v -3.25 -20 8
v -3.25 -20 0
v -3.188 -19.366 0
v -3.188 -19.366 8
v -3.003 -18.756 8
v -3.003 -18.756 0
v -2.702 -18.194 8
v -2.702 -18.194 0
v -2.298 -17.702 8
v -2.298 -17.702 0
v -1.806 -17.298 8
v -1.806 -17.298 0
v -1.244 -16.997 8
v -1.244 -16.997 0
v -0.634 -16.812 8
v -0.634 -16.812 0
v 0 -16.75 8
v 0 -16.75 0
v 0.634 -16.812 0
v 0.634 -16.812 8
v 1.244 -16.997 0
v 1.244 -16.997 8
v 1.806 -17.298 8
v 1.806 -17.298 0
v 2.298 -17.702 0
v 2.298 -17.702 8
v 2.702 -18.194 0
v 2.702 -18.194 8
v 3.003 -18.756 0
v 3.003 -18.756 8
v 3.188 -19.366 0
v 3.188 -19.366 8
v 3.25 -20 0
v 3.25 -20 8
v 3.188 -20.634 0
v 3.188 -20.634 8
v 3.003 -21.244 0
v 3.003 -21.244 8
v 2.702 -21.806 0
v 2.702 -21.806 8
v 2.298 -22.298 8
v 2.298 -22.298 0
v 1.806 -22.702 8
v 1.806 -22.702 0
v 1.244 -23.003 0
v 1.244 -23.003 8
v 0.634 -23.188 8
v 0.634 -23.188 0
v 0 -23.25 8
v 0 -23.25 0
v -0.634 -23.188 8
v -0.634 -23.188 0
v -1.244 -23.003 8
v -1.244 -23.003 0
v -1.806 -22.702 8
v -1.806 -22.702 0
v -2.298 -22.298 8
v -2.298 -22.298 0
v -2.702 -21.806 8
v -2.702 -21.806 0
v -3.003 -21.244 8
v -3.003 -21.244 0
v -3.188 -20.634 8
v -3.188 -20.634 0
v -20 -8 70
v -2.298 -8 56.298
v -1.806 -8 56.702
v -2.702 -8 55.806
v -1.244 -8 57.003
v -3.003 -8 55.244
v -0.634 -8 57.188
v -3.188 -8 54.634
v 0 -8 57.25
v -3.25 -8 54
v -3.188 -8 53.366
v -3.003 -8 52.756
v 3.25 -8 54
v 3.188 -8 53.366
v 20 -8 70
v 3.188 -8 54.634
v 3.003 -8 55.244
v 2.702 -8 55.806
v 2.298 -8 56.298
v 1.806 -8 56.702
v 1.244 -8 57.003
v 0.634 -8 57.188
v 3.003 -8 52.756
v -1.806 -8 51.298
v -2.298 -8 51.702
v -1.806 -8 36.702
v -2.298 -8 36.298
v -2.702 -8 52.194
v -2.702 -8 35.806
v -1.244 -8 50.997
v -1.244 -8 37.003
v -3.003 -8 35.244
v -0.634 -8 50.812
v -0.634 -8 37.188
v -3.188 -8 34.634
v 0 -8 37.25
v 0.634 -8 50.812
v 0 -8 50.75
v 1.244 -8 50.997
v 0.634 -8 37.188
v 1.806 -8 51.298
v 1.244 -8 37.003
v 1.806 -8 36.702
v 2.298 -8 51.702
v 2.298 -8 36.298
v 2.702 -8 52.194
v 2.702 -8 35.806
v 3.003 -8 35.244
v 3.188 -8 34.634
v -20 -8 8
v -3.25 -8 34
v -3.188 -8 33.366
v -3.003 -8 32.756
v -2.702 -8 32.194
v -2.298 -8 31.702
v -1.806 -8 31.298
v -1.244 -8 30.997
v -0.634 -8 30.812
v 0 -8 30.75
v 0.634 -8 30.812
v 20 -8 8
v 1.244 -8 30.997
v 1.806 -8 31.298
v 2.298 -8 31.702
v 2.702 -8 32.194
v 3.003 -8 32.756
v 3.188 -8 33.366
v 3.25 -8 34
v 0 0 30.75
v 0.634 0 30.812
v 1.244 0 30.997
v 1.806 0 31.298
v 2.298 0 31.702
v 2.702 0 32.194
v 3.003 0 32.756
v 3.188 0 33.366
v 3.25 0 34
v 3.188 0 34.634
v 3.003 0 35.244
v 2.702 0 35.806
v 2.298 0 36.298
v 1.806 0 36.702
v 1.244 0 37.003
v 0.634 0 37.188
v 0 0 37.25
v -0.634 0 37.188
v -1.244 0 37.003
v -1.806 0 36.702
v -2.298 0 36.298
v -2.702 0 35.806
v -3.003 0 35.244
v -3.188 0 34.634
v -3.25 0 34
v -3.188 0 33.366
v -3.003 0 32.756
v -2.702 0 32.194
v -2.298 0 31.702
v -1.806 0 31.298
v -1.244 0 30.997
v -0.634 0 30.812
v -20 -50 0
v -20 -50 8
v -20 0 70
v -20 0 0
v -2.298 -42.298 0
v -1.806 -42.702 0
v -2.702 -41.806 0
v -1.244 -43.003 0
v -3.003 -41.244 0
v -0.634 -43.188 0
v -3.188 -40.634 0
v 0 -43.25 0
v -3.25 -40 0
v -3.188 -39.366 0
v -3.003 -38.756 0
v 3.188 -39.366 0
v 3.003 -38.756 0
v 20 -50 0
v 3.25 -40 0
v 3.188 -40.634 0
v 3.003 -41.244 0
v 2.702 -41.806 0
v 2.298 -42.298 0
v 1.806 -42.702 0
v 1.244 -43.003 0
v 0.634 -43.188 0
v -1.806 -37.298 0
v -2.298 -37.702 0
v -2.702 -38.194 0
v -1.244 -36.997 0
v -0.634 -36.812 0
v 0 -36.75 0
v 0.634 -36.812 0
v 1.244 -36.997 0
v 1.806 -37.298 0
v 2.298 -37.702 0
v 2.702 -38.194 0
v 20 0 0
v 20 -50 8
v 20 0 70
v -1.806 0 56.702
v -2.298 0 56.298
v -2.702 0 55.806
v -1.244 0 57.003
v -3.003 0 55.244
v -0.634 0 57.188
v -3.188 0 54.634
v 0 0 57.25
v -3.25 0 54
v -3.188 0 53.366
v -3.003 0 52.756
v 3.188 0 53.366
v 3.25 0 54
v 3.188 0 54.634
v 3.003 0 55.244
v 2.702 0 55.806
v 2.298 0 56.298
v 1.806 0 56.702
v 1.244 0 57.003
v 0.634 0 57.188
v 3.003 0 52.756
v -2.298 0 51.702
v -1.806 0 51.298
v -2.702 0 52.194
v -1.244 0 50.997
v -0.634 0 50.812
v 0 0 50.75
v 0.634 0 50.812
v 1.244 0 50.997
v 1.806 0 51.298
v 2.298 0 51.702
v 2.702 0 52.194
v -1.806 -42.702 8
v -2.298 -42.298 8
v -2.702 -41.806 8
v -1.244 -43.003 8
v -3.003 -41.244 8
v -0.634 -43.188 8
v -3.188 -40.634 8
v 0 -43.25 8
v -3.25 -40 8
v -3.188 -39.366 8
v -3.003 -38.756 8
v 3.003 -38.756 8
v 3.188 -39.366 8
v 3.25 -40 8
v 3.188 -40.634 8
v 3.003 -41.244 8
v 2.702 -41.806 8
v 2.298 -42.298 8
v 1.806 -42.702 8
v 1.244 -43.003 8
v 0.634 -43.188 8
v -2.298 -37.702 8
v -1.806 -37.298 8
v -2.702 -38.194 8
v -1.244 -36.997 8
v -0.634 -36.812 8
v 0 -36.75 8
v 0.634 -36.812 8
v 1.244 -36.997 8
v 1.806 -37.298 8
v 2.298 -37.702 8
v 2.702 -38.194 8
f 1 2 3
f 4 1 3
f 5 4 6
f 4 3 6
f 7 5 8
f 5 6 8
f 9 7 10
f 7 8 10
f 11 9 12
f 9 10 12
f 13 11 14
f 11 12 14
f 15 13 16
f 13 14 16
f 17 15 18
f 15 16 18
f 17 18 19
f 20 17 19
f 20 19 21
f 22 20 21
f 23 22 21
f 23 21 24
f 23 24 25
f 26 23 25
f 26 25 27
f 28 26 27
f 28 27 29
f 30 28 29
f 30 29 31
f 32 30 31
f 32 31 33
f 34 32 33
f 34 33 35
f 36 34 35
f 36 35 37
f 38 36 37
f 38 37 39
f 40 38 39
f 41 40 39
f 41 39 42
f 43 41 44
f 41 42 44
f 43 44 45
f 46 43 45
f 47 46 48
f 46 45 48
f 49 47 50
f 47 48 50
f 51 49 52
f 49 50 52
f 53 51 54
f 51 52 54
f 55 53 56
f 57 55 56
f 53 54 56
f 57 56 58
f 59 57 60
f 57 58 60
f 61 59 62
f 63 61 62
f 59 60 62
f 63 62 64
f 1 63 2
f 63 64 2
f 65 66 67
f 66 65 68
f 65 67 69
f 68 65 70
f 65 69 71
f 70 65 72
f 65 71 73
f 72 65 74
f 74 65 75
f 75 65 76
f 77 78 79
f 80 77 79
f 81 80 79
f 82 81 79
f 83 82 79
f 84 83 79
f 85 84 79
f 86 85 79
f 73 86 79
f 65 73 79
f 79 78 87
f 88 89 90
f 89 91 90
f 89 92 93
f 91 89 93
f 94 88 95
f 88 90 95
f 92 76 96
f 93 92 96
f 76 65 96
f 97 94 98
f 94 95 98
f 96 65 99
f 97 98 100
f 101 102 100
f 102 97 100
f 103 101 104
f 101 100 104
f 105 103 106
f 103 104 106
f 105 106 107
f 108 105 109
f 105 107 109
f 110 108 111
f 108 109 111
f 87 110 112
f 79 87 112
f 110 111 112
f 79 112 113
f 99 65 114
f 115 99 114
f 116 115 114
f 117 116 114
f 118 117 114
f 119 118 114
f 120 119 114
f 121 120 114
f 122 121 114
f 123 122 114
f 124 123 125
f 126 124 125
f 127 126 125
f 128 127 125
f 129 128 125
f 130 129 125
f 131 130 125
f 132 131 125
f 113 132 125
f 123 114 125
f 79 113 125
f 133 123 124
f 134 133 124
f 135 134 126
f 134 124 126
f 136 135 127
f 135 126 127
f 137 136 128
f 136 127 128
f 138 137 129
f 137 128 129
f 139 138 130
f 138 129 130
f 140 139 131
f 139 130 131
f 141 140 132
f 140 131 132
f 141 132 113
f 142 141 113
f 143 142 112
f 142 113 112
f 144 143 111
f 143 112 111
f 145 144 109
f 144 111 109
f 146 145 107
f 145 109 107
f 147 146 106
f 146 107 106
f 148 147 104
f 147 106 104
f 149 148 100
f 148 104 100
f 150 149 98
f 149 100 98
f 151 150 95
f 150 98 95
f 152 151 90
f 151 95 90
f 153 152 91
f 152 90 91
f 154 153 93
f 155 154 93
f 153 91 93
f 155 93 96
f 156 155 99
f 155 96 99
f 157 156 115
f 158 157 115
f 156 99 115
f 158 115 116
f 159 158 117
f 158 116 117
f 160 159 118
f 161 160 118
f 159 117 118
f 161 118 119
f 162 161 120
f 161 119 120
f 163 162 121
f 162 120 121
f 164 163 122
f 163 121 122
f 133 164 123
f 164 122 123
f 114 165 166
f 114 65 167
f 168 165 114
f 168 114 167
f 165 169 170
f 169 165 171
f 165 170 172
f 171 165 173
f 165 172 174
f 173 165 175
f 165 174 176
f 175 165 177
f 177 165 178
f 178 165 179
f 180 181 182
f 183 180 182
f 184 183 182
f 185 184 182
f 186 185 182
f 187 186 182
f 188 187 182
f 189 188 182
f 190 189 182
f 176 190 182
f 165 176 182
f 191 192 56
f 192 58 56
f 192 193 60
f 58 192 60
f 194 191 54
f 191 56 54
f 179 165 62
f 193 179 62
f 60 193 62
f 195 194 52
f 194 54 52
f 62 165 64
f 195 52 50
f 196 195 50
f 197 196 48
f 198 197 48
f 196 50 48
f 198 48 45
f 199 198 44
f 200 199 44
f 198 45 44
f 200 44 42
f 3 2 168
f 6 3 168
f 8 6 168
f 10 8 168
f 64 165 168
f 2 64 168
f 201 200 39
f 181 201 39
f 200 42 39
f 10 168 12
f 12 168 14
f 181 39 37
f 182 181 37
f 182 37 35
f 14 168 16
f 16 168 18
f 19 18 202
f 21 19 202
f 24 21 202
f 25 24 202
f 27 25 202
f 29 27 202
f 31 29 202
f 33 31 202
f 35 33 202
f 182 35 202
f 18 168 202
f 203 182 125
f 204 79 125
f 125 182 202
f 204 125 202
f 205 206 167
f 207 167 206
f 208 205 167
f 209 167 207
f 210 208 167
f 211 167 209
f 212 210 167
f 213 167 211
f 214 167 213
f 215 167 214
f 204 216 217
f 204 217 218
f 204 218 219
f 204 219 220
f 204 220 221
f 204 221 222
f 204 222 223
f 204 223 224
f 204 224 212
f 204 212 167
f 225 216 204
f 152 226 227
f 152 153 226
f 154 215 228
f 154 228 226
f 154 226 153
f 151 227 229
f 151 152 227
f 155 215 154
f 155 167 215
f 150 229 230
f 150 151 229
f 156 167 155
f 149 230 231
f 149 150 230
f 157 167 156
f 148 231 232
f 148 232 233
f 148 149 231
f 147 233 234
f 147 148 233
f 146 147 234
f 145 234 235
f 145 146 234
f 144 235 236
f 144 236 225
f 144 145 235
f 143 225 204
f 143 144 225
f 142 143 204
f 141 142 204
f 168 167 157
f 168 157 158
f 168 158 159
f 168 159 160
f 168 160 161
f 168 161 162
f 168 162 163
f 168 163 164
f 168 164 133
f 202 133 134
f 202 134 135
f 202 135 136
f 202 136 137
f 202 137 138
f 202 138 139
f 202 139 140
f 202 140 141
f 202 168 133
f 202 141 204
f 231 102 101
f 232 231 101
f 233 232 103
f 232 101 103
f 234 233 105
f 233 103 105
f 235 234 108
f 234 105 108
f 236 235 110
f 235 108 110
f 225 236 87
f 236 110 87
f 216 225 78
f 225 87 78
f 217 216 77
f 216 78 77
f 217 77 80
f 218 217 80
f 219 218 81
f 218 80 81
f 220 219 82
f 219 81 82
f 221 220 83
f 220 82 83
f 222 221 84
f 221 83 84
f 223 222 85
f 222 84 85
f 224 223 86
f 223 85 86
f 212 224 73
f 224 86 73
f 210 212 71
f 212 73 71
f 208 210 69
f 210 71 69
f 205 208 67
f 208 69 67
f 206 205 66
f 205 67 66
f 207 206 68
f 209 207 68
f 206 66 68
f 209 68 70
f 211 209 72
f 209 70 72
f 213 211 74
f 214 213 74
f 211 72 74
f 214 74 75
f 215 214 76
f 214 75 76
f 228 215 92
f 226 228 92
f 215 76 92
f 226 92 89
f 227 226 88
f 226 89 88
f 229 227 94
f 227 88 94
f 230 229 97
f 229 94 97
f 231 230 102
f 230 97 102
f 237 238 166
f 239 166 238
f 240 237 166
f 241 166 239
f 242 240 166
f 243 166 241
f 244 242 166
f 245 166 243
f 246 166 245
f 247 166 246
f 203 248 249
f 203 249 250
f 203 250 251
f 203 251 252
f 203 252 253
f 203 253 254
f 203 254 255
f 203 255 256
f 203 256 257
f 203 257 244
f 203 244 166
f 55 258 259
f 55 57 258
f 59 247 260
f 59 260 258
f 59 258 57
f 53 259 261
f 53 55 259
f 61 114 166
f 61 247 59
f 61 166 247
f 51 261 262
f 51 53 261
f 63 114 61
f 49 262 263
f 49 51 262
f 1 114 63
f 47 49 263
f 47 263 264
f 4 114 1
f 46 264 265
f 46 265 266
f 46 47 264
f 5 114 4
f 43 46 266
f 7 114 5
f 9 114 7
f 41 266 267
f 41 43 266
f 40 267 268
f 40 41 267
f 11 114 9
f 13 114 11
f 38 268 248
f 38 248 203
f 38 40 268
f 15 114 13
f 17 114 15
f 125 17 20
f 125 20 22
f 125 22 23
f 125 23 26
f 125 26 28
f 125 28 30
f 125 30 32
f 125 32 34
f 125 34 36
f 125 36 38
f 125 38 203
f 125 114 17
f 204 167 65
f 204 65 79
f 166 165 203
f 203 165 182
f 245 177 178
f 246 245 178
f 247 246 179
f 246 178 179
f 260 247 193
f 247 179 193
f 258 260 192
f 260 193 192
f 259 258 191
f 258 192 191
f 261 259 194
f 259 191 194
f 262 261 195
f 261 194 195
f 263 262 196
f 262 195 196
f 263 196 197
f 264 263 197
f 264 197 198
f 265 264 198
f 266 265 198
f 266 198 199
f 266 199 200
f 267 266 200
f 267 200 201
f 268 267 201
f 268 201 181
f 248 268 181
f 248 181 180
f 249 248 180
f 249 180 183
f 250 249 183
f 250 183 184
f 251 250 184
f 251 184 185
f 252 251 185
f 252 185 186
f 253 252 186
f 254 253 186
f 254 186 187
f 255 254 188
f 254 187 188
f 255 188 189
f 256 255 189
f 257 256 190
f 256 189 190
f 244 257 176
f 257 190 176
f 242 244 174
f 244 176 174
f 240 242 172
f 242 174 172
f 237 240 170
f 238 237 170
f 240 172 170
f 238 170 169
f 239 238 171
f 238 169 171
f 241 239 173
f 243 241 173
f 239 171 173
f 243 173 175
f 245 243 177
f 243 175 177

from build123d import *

# Parameters (mm, degrees)
SKETCH_1_W          = 40
SKETCH_1_H          = 50
EXTRUDE_1_DEPTH     = 8
SKETCH_2_W          = 40
SKETCH_2_H          = 8
EXTRUDE_2_DEPTH     = 70
SKETCH_3_R          = 3.25
CUT_EXTRUDE_1_DEPTH = 9
SKETCH_4_R          = 3.25
CUT_EXTRUDE_2_DEPTH = 8


with BuildPart() as part:
    # 草图1 → 凸台-拉伸1 (new body)
    with BuildSketch(Plane.XY):
        with Locations((0, -25)):
            Rectangle(SKETCH_1_W, SKETCH_1_H)
    extrude(amount=EXTRUDE_1_DEPTH)

    # 草图2 → 凸台-拉伸2 (add)
    with BuildSketch(Plane.XY):
        with Locations((0, -4)):
            Rectangle(SKETCH_2_W, SKETCH_2_H)
    extrude(amount=EXTRUDE_2_DEPTH)

    # 草图3 → 切除-拉伸1 (cut)
    with BuildSketch(Plane(origin=(0, 0, 0), x_dir=(-1, 0, 0), z_dir=(0, 0, -1))):
        with Locations((0, -20)):
            Circle(SKETCH_3_R)
        with Locations((0, -40)):
            Circle(SKETCH_3_R)
    extrude(amount=-CUT_EXTRUDE_1_DEPTH, mode=Mode.SUBTRACT)

    # 草图4 → 切除-拉伸2 (cut)
    with BuildSketch(Plane.XZ.offset(8)):
        with Locations(Location((0, 34, 0), (0, 0, 270))):
            Circle(SKETCH_4_R)
        with Locations(Location((0, 54, 0), (0, 0, 270))):
            Circle(SKETCH_4_R)
    extrude(amount=-CUT_EXTRUDE_2_DEPTH, mode=Mode.SUBTRACT)


solid = part.part
